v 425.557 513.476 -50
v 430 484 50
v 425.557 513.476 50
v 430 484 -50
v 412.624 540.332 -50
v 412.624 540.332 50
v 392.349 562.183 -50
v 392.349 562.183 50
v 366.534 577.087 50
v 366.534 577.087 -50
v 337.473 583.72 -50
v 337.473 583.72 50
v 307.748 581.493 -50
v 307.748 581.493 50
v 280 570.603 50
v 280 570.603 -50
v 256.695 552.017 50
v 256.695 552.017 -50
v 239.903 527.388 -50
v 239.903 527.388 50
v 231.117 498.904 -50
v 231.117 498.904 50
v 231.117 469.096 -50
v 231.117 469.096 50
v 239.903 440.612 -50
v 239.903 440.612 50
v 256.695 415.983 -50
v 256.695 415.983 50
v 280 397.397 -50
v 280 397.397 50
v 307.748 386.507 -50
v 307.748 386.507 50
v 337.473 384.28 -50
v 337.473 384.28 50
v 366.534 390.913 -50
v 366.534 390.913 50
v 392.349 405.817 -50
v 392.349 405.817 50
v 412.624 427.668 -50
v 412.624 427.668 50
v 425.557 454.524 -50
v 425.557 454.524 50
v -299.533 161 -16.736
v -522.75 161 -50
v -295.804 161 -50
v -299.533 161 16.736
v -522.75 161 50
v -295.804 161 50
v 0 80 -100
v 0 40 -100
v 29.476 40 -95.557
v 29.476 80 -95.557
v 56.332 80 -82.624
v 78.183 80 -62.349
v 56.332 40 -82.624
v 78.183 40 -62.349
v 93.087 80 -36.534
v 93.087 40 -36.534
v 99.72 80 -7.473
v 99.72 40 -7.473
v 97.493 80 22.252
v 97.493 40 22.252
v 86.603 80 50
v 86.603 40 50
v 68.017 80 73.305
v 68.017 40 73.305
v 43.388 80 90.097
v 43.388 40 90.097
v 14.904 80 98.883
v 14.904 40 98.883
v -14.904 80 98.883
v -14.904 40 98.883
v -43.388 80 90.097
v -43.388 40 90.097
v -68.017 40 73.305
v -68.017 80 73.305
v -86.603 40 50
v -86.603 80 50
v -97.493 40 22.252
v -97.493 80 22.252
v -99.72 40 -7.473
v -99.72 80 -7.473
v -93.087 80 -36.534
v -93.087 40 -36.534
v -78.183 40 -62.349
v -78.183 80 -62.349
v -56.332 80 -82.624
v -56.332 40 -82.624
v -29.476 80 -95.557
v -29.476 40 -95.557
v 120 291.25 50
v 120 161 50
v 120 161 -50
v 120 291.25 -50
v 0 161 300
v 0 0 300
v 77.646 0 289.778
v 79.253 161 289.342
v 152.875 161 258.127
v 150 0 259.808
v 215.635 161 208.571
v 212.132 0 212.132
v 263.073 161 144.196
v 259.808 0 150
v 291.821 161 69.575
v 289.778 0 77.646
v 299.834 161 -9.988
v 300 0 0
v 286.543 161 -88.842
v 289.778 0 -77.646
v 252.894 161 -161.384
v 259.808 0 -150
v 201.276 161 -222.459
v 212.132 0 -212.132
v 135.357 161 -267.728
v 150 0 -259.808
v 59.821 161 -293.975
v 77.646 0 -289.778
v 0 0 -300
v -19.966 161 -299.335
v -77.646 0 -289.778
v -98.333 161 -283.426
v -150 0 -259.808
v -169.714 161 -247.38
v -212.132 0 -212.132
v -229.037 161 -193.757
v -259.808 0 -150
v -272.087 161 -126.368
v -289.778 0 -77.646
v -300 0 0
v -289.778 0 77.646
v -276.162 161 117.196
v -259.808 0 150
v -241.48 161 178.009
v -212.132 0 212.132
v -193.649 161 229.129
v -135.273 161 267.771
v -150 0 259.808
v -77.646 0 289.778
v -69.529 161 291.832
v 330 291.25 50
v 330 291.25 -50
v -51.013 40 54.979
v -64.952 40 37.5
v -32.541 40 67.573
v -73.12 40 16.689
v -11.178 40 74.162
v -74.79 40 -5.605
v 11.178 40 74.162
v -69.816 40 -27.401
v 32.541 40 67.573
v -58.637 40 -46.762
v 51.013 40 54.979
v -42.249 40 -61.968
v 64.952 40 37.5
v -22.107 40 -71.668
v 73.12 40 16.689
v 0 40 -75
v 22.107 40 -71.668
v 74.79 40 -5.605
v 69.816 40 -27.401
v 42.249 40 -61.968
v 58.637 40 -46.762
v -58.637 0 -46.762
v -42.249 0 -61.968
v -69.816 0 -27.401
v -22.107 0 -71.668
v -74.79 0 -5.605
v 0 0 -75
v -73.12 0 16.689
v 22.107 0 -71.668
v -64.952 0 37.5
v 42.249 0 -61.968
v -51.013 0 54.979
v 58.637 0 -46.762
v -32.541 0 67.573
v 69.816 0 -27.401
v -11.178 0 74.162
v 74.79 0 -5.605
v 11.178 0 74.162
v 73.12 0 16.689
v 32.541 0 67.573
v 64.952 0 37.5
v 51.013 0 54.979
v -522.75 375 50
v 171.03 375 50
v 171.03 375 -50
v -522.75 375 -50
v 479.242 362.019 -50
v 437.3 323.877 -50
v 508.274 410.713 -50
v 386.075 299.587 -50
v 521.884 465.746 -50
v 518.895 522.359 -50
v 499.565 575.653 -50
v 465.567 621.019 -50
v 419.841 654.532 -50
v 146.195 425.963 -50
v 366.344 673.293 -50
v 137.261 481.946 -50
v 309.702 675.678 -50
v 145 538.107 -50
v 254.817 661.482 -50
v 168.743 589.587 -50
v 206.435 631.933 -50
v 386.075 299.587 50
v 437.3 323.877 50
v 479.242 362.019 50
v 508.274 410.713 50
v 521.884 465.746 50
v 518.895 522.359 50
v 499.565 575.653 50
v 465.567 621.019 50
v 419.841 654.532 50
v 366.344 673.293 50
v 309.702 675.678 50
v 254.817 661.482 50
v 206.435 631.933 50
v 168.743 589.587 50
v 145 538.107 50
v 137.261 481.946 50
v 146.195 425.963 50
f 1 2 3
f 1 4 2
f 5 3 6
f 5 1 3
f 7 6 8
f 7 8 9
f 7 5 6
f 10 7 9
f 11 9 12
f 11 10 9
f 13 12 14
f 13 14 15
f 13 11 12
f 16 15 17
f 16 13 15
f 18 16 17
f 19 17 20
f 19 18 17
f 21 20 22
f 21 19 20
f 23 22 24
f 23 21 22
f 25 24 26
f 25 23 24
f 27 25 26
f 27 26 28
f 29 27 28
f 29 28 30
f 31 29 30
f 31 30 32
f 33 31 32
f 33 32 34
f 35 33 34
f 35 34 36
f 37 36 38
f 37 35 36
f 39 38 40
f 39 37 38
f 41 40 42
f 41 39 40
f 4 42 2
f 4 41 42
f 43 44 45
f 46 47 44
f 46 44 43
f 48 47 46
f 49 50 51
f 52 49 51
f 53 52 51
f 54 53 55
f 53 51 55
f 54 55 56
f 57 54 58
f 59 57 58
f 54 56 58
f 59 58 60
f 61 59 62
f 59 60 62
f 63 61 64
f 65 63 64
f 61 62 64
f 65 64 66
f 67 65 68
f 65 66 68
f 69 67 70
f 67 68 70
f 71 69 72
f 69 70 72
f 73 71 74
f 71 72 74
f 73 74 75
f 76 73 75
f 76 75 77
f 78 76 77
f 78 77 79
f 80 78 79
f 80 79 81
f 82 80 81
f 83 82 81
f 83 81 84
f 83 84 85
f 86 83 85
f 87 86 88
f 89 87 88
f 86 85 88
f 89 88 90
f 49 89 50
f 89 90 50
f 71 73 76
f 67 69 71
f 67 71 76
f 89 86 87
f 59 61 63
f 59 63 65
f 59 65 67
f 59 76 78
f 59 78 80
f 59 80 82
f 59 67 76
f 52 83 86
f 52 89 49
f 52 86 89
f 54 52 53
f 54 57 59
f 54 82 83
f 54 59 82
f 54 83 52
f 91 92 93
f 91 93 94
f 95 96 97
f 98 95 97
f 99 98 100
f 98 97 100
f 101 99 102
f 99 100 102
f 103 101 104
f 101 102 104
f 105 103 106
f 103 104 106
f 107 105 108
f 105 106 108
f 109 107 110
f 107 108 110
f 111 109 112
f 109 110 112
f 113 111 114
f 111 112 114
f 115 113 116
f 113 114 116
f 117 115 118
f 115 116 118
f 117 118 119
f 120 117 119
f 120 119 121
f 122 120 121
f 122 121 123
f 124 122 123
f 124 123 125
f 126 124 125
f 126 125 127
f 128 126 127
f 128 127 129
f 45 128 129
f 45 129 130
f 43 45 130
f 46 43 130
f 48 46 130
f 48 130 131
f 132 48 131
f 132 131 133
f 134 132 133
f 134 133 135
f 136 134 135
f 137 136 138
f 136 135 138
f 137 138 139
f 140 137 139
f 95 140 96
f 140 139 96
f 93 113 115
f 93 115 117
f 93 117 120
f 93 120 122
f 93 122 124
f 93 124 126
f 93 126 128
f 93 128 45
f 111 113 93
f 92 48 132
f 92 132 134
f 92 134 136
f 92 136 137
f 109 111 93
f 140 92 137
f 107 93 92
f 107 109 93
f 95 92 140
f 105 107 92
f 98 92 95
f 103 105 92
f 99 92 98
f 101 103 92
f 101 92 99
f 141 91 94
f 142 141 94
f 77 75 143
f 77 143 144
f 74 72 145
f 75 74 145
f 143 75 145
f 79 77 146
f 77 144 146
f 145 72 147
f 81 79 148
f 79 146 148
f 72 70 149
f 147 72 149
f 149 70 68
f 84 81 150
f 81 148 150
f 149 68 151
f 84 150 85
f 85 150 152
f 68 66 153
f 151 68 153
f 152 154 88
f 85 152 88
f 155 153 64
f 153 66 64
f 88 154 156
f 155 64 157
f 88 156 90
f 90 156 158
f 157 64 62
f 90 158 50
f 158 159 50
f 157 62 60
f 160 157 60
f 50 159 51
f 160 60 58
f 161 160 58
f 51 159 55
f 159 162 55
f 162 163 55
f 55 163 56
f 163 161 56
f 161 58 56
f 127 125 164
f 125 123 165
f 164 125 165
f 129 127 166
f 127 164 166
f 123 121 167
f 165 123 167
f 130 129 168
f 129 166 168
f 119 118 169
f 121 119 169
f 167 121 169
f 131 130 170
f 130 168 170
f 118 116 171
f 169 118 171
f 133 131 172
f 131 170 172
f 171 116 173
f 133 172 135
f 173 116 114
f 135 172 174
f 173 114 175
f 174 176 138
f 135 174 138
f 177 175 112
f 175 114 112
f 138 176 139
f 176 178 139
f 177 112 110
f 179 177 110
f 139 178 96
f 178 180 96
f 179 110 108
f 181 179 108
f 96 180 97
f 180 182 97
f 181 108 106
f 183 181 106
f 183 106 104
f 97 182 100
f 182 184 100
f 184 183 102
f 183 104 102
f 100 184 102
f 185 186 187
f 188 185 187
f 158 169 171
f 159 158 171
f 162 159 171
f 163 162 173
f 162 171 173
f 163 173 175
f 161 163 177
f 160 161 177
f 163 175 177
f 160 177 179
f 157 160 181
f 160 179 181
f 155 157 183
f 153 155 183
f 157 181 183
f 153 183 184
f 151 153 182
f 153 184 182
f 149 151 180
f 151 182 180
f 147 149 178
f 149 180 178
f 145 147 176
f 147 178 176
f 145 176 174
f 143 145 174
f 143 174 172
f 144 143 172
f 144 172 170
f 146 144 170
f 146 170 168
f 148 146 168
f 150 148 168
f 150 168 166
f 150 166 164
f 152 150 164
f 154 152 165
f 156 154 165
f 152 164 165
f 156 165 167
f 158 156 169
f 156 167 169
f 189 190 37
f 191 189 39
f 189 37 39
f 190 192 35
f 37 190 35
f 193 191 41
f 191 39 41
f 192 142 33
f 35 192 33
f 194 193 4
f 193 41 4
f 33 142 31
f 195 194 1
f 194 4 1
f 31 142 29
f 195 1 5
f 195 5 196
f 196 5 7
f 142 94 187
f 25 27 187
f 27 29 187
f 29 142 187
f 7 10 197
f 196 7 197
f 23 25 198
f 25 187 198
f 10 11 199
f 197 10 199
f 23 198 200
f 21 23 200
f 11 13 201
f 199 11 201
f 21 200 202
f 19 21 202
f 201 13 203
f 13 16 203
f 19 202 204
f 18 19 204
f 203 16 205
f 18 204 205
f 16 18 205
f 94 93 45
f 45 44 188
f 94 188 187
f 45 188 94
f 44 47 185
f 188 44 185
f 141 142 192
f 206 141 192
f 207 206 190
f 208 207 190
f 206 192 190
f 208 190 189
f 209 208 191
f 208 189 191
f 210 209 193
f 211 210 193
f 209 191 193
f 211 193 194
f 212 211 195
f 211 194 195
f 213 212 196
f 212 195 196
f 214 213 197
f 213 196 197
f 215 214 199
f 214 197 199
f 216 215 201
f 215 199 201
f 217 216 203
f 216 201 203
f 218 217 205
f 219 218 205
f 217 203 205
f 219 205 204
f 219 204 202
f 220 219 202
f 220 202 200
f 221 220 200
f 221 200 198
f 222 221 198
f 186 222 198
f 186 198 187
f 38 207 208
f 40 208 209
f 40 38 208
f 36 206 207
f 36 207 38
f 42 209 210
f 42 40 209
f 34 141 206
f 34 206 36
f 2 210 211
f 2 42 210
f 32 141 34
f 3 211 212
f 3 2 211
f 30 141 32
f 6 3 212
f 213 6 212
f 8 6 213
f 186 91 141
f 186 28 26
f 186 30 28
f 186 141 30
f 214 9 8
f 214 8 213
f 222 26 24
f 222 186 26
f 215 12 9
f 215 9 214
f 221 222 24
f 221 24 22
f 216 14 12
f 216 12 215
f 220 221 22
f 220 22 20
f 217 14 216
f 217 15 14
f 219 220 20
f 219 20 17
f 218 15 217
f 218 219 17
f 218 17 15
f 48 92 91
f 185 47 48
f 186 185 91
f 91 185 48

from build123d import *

# Parameters (mm, degrees)
SKETCH1_R                = 300
BOSS_EXTRUDE1_DEPTH      = 161
SKETCH2_R                = 192.75
SKETCH2_R_2              = 100
SKETCH2_W                = 642.75
SKETCH2_H                = 214
BOSS_EXTRUDE2_DEPTH      = 50
SKETCH3_R                = 75
CUT_EXTRUDE1_DEPTH       = 40
SKETCH4_R                = 100
CUT_EXTRUDE2_DEPTH       = 40
BOSS_EXTRUDE3_REACH      = 982.366
BOSS_EXTRUDE3_END_RADIUS = 192.75
SKETCH5_W                = 100
SKETCH5_H                = 83.75


with BuildPart() as part:
    # Sketch1 → Boss-Extrude1 (new body)
    with BuildSketch(Plane(origin=(0, 0, 0), x_dir=(1, 0, 0), z_dir=(0, 1, 0))):
        with Locations(Location((0, 0, 0), (0, 0, 270))):
            Circle(SKETCH1_R)
    extrude(amount=BOSS_EXTRUDE1_DEPTH)

    # Sketch2 → Boss-Extrude2 (add, symmetric)
    # profile 1 of 2: a face of its own
    with BuildSketch(Plane.XY):
        with Locations((330, 484)):
            Circle(SKETCH2_R)
        with Locations((330, 484)):
            Circle(SKETCH2_R_2, mode=Mode.SUBTRACT)
    # profile 2 of 2: a face of its own
    with BuildSketch(Plane.XY):
        with Locations((-201.375, 268)):
            Rectangle(SKETCH2_W, SKETCH2_H)
    extrude(amount=BOSS_EXTRUDE2_DEPTH, both=True)


with BuildPart() as boss_extrude2_piece_1:
    # of the separate pieces the step leaves, piece 1, a body of its own (boss_extrude2_pieces)
    add(part.part.solids().sort_by_distance((0, 0, 300))[0])

    # Sketch3 → Cut-Extrude1 (cut)
    with BuildSketch(Plane.XZ):
        with Locations(Location((0, 0, 0), (0, 0, 270))):
            Circle(SKETCH3_R)
    extrude(amount=-CUT_EXTRUDE1_DEPTH, mode=Mode.SUBTRACT)

    # Sketch4 → Cut-Extrude2 (cut)
    with BuildSketch(Plane.XZ.offset(-40)):
        with Locations(Location((0, 0, 0), (0, 0, 270))):
            Circle(SKETCH4_R)
    extrude(amount=-CUT_EXTRUDE2_DEPTH, mode=Mode.SUBTRACT)



with BuildPart() as boss_extrude2_piece_2:
    # of the separate pieces the step leaves, piece 2, a body of its own (boss_extrude2_pieces)
    add(part.part.solids().sort_by_distance((522.75, 484, -50))[0])


with BuildPart() as boss_extrude2_piece_1_1:
    add(boss_extrude2_piece_1.part)

    add(boss_extrude2_piece_2.part)  # Boss-Extrude3 merges Boss-Extrude2 piece 2
    # Boss-Extrude3: up to this cylinder (the profile starts outside it)
    boss_extrude3_end = Plane(origin=(330, 484, 0), z_dir=(0, 0, -1)) * Cylinder(BOSS_EXTRUDE3_END_RADIUS, 2351.232, mode=Mode.PRIVATE)
    # Sketch5 → Boss-Extrude3 (add, up to the surface)
    with BuildSketch(Plane(origin=(120, 0, 0), x_dir=(0, 0, -1), z_dir=(1, 0, 0)), mode=Mode.PRIVATE) as boss_extrude3_sk1:
        with Locations((0, 333.125)):
            Rectangle(SKETCH5_W, SKETCH5_H)
    boss_extrude3_tool1 = extrude(boss_extrude3_sk1.sketch, amount=BOSS_EXTRUDE3_REACH, mode=Mode.PRIVATE) - boss_extrude3_end
    add(boss_extrude3_tool1.solids().sort_by_distance((120, 333.125, 0))[0])


solid = boss_extrude2_piece_1_1.part
